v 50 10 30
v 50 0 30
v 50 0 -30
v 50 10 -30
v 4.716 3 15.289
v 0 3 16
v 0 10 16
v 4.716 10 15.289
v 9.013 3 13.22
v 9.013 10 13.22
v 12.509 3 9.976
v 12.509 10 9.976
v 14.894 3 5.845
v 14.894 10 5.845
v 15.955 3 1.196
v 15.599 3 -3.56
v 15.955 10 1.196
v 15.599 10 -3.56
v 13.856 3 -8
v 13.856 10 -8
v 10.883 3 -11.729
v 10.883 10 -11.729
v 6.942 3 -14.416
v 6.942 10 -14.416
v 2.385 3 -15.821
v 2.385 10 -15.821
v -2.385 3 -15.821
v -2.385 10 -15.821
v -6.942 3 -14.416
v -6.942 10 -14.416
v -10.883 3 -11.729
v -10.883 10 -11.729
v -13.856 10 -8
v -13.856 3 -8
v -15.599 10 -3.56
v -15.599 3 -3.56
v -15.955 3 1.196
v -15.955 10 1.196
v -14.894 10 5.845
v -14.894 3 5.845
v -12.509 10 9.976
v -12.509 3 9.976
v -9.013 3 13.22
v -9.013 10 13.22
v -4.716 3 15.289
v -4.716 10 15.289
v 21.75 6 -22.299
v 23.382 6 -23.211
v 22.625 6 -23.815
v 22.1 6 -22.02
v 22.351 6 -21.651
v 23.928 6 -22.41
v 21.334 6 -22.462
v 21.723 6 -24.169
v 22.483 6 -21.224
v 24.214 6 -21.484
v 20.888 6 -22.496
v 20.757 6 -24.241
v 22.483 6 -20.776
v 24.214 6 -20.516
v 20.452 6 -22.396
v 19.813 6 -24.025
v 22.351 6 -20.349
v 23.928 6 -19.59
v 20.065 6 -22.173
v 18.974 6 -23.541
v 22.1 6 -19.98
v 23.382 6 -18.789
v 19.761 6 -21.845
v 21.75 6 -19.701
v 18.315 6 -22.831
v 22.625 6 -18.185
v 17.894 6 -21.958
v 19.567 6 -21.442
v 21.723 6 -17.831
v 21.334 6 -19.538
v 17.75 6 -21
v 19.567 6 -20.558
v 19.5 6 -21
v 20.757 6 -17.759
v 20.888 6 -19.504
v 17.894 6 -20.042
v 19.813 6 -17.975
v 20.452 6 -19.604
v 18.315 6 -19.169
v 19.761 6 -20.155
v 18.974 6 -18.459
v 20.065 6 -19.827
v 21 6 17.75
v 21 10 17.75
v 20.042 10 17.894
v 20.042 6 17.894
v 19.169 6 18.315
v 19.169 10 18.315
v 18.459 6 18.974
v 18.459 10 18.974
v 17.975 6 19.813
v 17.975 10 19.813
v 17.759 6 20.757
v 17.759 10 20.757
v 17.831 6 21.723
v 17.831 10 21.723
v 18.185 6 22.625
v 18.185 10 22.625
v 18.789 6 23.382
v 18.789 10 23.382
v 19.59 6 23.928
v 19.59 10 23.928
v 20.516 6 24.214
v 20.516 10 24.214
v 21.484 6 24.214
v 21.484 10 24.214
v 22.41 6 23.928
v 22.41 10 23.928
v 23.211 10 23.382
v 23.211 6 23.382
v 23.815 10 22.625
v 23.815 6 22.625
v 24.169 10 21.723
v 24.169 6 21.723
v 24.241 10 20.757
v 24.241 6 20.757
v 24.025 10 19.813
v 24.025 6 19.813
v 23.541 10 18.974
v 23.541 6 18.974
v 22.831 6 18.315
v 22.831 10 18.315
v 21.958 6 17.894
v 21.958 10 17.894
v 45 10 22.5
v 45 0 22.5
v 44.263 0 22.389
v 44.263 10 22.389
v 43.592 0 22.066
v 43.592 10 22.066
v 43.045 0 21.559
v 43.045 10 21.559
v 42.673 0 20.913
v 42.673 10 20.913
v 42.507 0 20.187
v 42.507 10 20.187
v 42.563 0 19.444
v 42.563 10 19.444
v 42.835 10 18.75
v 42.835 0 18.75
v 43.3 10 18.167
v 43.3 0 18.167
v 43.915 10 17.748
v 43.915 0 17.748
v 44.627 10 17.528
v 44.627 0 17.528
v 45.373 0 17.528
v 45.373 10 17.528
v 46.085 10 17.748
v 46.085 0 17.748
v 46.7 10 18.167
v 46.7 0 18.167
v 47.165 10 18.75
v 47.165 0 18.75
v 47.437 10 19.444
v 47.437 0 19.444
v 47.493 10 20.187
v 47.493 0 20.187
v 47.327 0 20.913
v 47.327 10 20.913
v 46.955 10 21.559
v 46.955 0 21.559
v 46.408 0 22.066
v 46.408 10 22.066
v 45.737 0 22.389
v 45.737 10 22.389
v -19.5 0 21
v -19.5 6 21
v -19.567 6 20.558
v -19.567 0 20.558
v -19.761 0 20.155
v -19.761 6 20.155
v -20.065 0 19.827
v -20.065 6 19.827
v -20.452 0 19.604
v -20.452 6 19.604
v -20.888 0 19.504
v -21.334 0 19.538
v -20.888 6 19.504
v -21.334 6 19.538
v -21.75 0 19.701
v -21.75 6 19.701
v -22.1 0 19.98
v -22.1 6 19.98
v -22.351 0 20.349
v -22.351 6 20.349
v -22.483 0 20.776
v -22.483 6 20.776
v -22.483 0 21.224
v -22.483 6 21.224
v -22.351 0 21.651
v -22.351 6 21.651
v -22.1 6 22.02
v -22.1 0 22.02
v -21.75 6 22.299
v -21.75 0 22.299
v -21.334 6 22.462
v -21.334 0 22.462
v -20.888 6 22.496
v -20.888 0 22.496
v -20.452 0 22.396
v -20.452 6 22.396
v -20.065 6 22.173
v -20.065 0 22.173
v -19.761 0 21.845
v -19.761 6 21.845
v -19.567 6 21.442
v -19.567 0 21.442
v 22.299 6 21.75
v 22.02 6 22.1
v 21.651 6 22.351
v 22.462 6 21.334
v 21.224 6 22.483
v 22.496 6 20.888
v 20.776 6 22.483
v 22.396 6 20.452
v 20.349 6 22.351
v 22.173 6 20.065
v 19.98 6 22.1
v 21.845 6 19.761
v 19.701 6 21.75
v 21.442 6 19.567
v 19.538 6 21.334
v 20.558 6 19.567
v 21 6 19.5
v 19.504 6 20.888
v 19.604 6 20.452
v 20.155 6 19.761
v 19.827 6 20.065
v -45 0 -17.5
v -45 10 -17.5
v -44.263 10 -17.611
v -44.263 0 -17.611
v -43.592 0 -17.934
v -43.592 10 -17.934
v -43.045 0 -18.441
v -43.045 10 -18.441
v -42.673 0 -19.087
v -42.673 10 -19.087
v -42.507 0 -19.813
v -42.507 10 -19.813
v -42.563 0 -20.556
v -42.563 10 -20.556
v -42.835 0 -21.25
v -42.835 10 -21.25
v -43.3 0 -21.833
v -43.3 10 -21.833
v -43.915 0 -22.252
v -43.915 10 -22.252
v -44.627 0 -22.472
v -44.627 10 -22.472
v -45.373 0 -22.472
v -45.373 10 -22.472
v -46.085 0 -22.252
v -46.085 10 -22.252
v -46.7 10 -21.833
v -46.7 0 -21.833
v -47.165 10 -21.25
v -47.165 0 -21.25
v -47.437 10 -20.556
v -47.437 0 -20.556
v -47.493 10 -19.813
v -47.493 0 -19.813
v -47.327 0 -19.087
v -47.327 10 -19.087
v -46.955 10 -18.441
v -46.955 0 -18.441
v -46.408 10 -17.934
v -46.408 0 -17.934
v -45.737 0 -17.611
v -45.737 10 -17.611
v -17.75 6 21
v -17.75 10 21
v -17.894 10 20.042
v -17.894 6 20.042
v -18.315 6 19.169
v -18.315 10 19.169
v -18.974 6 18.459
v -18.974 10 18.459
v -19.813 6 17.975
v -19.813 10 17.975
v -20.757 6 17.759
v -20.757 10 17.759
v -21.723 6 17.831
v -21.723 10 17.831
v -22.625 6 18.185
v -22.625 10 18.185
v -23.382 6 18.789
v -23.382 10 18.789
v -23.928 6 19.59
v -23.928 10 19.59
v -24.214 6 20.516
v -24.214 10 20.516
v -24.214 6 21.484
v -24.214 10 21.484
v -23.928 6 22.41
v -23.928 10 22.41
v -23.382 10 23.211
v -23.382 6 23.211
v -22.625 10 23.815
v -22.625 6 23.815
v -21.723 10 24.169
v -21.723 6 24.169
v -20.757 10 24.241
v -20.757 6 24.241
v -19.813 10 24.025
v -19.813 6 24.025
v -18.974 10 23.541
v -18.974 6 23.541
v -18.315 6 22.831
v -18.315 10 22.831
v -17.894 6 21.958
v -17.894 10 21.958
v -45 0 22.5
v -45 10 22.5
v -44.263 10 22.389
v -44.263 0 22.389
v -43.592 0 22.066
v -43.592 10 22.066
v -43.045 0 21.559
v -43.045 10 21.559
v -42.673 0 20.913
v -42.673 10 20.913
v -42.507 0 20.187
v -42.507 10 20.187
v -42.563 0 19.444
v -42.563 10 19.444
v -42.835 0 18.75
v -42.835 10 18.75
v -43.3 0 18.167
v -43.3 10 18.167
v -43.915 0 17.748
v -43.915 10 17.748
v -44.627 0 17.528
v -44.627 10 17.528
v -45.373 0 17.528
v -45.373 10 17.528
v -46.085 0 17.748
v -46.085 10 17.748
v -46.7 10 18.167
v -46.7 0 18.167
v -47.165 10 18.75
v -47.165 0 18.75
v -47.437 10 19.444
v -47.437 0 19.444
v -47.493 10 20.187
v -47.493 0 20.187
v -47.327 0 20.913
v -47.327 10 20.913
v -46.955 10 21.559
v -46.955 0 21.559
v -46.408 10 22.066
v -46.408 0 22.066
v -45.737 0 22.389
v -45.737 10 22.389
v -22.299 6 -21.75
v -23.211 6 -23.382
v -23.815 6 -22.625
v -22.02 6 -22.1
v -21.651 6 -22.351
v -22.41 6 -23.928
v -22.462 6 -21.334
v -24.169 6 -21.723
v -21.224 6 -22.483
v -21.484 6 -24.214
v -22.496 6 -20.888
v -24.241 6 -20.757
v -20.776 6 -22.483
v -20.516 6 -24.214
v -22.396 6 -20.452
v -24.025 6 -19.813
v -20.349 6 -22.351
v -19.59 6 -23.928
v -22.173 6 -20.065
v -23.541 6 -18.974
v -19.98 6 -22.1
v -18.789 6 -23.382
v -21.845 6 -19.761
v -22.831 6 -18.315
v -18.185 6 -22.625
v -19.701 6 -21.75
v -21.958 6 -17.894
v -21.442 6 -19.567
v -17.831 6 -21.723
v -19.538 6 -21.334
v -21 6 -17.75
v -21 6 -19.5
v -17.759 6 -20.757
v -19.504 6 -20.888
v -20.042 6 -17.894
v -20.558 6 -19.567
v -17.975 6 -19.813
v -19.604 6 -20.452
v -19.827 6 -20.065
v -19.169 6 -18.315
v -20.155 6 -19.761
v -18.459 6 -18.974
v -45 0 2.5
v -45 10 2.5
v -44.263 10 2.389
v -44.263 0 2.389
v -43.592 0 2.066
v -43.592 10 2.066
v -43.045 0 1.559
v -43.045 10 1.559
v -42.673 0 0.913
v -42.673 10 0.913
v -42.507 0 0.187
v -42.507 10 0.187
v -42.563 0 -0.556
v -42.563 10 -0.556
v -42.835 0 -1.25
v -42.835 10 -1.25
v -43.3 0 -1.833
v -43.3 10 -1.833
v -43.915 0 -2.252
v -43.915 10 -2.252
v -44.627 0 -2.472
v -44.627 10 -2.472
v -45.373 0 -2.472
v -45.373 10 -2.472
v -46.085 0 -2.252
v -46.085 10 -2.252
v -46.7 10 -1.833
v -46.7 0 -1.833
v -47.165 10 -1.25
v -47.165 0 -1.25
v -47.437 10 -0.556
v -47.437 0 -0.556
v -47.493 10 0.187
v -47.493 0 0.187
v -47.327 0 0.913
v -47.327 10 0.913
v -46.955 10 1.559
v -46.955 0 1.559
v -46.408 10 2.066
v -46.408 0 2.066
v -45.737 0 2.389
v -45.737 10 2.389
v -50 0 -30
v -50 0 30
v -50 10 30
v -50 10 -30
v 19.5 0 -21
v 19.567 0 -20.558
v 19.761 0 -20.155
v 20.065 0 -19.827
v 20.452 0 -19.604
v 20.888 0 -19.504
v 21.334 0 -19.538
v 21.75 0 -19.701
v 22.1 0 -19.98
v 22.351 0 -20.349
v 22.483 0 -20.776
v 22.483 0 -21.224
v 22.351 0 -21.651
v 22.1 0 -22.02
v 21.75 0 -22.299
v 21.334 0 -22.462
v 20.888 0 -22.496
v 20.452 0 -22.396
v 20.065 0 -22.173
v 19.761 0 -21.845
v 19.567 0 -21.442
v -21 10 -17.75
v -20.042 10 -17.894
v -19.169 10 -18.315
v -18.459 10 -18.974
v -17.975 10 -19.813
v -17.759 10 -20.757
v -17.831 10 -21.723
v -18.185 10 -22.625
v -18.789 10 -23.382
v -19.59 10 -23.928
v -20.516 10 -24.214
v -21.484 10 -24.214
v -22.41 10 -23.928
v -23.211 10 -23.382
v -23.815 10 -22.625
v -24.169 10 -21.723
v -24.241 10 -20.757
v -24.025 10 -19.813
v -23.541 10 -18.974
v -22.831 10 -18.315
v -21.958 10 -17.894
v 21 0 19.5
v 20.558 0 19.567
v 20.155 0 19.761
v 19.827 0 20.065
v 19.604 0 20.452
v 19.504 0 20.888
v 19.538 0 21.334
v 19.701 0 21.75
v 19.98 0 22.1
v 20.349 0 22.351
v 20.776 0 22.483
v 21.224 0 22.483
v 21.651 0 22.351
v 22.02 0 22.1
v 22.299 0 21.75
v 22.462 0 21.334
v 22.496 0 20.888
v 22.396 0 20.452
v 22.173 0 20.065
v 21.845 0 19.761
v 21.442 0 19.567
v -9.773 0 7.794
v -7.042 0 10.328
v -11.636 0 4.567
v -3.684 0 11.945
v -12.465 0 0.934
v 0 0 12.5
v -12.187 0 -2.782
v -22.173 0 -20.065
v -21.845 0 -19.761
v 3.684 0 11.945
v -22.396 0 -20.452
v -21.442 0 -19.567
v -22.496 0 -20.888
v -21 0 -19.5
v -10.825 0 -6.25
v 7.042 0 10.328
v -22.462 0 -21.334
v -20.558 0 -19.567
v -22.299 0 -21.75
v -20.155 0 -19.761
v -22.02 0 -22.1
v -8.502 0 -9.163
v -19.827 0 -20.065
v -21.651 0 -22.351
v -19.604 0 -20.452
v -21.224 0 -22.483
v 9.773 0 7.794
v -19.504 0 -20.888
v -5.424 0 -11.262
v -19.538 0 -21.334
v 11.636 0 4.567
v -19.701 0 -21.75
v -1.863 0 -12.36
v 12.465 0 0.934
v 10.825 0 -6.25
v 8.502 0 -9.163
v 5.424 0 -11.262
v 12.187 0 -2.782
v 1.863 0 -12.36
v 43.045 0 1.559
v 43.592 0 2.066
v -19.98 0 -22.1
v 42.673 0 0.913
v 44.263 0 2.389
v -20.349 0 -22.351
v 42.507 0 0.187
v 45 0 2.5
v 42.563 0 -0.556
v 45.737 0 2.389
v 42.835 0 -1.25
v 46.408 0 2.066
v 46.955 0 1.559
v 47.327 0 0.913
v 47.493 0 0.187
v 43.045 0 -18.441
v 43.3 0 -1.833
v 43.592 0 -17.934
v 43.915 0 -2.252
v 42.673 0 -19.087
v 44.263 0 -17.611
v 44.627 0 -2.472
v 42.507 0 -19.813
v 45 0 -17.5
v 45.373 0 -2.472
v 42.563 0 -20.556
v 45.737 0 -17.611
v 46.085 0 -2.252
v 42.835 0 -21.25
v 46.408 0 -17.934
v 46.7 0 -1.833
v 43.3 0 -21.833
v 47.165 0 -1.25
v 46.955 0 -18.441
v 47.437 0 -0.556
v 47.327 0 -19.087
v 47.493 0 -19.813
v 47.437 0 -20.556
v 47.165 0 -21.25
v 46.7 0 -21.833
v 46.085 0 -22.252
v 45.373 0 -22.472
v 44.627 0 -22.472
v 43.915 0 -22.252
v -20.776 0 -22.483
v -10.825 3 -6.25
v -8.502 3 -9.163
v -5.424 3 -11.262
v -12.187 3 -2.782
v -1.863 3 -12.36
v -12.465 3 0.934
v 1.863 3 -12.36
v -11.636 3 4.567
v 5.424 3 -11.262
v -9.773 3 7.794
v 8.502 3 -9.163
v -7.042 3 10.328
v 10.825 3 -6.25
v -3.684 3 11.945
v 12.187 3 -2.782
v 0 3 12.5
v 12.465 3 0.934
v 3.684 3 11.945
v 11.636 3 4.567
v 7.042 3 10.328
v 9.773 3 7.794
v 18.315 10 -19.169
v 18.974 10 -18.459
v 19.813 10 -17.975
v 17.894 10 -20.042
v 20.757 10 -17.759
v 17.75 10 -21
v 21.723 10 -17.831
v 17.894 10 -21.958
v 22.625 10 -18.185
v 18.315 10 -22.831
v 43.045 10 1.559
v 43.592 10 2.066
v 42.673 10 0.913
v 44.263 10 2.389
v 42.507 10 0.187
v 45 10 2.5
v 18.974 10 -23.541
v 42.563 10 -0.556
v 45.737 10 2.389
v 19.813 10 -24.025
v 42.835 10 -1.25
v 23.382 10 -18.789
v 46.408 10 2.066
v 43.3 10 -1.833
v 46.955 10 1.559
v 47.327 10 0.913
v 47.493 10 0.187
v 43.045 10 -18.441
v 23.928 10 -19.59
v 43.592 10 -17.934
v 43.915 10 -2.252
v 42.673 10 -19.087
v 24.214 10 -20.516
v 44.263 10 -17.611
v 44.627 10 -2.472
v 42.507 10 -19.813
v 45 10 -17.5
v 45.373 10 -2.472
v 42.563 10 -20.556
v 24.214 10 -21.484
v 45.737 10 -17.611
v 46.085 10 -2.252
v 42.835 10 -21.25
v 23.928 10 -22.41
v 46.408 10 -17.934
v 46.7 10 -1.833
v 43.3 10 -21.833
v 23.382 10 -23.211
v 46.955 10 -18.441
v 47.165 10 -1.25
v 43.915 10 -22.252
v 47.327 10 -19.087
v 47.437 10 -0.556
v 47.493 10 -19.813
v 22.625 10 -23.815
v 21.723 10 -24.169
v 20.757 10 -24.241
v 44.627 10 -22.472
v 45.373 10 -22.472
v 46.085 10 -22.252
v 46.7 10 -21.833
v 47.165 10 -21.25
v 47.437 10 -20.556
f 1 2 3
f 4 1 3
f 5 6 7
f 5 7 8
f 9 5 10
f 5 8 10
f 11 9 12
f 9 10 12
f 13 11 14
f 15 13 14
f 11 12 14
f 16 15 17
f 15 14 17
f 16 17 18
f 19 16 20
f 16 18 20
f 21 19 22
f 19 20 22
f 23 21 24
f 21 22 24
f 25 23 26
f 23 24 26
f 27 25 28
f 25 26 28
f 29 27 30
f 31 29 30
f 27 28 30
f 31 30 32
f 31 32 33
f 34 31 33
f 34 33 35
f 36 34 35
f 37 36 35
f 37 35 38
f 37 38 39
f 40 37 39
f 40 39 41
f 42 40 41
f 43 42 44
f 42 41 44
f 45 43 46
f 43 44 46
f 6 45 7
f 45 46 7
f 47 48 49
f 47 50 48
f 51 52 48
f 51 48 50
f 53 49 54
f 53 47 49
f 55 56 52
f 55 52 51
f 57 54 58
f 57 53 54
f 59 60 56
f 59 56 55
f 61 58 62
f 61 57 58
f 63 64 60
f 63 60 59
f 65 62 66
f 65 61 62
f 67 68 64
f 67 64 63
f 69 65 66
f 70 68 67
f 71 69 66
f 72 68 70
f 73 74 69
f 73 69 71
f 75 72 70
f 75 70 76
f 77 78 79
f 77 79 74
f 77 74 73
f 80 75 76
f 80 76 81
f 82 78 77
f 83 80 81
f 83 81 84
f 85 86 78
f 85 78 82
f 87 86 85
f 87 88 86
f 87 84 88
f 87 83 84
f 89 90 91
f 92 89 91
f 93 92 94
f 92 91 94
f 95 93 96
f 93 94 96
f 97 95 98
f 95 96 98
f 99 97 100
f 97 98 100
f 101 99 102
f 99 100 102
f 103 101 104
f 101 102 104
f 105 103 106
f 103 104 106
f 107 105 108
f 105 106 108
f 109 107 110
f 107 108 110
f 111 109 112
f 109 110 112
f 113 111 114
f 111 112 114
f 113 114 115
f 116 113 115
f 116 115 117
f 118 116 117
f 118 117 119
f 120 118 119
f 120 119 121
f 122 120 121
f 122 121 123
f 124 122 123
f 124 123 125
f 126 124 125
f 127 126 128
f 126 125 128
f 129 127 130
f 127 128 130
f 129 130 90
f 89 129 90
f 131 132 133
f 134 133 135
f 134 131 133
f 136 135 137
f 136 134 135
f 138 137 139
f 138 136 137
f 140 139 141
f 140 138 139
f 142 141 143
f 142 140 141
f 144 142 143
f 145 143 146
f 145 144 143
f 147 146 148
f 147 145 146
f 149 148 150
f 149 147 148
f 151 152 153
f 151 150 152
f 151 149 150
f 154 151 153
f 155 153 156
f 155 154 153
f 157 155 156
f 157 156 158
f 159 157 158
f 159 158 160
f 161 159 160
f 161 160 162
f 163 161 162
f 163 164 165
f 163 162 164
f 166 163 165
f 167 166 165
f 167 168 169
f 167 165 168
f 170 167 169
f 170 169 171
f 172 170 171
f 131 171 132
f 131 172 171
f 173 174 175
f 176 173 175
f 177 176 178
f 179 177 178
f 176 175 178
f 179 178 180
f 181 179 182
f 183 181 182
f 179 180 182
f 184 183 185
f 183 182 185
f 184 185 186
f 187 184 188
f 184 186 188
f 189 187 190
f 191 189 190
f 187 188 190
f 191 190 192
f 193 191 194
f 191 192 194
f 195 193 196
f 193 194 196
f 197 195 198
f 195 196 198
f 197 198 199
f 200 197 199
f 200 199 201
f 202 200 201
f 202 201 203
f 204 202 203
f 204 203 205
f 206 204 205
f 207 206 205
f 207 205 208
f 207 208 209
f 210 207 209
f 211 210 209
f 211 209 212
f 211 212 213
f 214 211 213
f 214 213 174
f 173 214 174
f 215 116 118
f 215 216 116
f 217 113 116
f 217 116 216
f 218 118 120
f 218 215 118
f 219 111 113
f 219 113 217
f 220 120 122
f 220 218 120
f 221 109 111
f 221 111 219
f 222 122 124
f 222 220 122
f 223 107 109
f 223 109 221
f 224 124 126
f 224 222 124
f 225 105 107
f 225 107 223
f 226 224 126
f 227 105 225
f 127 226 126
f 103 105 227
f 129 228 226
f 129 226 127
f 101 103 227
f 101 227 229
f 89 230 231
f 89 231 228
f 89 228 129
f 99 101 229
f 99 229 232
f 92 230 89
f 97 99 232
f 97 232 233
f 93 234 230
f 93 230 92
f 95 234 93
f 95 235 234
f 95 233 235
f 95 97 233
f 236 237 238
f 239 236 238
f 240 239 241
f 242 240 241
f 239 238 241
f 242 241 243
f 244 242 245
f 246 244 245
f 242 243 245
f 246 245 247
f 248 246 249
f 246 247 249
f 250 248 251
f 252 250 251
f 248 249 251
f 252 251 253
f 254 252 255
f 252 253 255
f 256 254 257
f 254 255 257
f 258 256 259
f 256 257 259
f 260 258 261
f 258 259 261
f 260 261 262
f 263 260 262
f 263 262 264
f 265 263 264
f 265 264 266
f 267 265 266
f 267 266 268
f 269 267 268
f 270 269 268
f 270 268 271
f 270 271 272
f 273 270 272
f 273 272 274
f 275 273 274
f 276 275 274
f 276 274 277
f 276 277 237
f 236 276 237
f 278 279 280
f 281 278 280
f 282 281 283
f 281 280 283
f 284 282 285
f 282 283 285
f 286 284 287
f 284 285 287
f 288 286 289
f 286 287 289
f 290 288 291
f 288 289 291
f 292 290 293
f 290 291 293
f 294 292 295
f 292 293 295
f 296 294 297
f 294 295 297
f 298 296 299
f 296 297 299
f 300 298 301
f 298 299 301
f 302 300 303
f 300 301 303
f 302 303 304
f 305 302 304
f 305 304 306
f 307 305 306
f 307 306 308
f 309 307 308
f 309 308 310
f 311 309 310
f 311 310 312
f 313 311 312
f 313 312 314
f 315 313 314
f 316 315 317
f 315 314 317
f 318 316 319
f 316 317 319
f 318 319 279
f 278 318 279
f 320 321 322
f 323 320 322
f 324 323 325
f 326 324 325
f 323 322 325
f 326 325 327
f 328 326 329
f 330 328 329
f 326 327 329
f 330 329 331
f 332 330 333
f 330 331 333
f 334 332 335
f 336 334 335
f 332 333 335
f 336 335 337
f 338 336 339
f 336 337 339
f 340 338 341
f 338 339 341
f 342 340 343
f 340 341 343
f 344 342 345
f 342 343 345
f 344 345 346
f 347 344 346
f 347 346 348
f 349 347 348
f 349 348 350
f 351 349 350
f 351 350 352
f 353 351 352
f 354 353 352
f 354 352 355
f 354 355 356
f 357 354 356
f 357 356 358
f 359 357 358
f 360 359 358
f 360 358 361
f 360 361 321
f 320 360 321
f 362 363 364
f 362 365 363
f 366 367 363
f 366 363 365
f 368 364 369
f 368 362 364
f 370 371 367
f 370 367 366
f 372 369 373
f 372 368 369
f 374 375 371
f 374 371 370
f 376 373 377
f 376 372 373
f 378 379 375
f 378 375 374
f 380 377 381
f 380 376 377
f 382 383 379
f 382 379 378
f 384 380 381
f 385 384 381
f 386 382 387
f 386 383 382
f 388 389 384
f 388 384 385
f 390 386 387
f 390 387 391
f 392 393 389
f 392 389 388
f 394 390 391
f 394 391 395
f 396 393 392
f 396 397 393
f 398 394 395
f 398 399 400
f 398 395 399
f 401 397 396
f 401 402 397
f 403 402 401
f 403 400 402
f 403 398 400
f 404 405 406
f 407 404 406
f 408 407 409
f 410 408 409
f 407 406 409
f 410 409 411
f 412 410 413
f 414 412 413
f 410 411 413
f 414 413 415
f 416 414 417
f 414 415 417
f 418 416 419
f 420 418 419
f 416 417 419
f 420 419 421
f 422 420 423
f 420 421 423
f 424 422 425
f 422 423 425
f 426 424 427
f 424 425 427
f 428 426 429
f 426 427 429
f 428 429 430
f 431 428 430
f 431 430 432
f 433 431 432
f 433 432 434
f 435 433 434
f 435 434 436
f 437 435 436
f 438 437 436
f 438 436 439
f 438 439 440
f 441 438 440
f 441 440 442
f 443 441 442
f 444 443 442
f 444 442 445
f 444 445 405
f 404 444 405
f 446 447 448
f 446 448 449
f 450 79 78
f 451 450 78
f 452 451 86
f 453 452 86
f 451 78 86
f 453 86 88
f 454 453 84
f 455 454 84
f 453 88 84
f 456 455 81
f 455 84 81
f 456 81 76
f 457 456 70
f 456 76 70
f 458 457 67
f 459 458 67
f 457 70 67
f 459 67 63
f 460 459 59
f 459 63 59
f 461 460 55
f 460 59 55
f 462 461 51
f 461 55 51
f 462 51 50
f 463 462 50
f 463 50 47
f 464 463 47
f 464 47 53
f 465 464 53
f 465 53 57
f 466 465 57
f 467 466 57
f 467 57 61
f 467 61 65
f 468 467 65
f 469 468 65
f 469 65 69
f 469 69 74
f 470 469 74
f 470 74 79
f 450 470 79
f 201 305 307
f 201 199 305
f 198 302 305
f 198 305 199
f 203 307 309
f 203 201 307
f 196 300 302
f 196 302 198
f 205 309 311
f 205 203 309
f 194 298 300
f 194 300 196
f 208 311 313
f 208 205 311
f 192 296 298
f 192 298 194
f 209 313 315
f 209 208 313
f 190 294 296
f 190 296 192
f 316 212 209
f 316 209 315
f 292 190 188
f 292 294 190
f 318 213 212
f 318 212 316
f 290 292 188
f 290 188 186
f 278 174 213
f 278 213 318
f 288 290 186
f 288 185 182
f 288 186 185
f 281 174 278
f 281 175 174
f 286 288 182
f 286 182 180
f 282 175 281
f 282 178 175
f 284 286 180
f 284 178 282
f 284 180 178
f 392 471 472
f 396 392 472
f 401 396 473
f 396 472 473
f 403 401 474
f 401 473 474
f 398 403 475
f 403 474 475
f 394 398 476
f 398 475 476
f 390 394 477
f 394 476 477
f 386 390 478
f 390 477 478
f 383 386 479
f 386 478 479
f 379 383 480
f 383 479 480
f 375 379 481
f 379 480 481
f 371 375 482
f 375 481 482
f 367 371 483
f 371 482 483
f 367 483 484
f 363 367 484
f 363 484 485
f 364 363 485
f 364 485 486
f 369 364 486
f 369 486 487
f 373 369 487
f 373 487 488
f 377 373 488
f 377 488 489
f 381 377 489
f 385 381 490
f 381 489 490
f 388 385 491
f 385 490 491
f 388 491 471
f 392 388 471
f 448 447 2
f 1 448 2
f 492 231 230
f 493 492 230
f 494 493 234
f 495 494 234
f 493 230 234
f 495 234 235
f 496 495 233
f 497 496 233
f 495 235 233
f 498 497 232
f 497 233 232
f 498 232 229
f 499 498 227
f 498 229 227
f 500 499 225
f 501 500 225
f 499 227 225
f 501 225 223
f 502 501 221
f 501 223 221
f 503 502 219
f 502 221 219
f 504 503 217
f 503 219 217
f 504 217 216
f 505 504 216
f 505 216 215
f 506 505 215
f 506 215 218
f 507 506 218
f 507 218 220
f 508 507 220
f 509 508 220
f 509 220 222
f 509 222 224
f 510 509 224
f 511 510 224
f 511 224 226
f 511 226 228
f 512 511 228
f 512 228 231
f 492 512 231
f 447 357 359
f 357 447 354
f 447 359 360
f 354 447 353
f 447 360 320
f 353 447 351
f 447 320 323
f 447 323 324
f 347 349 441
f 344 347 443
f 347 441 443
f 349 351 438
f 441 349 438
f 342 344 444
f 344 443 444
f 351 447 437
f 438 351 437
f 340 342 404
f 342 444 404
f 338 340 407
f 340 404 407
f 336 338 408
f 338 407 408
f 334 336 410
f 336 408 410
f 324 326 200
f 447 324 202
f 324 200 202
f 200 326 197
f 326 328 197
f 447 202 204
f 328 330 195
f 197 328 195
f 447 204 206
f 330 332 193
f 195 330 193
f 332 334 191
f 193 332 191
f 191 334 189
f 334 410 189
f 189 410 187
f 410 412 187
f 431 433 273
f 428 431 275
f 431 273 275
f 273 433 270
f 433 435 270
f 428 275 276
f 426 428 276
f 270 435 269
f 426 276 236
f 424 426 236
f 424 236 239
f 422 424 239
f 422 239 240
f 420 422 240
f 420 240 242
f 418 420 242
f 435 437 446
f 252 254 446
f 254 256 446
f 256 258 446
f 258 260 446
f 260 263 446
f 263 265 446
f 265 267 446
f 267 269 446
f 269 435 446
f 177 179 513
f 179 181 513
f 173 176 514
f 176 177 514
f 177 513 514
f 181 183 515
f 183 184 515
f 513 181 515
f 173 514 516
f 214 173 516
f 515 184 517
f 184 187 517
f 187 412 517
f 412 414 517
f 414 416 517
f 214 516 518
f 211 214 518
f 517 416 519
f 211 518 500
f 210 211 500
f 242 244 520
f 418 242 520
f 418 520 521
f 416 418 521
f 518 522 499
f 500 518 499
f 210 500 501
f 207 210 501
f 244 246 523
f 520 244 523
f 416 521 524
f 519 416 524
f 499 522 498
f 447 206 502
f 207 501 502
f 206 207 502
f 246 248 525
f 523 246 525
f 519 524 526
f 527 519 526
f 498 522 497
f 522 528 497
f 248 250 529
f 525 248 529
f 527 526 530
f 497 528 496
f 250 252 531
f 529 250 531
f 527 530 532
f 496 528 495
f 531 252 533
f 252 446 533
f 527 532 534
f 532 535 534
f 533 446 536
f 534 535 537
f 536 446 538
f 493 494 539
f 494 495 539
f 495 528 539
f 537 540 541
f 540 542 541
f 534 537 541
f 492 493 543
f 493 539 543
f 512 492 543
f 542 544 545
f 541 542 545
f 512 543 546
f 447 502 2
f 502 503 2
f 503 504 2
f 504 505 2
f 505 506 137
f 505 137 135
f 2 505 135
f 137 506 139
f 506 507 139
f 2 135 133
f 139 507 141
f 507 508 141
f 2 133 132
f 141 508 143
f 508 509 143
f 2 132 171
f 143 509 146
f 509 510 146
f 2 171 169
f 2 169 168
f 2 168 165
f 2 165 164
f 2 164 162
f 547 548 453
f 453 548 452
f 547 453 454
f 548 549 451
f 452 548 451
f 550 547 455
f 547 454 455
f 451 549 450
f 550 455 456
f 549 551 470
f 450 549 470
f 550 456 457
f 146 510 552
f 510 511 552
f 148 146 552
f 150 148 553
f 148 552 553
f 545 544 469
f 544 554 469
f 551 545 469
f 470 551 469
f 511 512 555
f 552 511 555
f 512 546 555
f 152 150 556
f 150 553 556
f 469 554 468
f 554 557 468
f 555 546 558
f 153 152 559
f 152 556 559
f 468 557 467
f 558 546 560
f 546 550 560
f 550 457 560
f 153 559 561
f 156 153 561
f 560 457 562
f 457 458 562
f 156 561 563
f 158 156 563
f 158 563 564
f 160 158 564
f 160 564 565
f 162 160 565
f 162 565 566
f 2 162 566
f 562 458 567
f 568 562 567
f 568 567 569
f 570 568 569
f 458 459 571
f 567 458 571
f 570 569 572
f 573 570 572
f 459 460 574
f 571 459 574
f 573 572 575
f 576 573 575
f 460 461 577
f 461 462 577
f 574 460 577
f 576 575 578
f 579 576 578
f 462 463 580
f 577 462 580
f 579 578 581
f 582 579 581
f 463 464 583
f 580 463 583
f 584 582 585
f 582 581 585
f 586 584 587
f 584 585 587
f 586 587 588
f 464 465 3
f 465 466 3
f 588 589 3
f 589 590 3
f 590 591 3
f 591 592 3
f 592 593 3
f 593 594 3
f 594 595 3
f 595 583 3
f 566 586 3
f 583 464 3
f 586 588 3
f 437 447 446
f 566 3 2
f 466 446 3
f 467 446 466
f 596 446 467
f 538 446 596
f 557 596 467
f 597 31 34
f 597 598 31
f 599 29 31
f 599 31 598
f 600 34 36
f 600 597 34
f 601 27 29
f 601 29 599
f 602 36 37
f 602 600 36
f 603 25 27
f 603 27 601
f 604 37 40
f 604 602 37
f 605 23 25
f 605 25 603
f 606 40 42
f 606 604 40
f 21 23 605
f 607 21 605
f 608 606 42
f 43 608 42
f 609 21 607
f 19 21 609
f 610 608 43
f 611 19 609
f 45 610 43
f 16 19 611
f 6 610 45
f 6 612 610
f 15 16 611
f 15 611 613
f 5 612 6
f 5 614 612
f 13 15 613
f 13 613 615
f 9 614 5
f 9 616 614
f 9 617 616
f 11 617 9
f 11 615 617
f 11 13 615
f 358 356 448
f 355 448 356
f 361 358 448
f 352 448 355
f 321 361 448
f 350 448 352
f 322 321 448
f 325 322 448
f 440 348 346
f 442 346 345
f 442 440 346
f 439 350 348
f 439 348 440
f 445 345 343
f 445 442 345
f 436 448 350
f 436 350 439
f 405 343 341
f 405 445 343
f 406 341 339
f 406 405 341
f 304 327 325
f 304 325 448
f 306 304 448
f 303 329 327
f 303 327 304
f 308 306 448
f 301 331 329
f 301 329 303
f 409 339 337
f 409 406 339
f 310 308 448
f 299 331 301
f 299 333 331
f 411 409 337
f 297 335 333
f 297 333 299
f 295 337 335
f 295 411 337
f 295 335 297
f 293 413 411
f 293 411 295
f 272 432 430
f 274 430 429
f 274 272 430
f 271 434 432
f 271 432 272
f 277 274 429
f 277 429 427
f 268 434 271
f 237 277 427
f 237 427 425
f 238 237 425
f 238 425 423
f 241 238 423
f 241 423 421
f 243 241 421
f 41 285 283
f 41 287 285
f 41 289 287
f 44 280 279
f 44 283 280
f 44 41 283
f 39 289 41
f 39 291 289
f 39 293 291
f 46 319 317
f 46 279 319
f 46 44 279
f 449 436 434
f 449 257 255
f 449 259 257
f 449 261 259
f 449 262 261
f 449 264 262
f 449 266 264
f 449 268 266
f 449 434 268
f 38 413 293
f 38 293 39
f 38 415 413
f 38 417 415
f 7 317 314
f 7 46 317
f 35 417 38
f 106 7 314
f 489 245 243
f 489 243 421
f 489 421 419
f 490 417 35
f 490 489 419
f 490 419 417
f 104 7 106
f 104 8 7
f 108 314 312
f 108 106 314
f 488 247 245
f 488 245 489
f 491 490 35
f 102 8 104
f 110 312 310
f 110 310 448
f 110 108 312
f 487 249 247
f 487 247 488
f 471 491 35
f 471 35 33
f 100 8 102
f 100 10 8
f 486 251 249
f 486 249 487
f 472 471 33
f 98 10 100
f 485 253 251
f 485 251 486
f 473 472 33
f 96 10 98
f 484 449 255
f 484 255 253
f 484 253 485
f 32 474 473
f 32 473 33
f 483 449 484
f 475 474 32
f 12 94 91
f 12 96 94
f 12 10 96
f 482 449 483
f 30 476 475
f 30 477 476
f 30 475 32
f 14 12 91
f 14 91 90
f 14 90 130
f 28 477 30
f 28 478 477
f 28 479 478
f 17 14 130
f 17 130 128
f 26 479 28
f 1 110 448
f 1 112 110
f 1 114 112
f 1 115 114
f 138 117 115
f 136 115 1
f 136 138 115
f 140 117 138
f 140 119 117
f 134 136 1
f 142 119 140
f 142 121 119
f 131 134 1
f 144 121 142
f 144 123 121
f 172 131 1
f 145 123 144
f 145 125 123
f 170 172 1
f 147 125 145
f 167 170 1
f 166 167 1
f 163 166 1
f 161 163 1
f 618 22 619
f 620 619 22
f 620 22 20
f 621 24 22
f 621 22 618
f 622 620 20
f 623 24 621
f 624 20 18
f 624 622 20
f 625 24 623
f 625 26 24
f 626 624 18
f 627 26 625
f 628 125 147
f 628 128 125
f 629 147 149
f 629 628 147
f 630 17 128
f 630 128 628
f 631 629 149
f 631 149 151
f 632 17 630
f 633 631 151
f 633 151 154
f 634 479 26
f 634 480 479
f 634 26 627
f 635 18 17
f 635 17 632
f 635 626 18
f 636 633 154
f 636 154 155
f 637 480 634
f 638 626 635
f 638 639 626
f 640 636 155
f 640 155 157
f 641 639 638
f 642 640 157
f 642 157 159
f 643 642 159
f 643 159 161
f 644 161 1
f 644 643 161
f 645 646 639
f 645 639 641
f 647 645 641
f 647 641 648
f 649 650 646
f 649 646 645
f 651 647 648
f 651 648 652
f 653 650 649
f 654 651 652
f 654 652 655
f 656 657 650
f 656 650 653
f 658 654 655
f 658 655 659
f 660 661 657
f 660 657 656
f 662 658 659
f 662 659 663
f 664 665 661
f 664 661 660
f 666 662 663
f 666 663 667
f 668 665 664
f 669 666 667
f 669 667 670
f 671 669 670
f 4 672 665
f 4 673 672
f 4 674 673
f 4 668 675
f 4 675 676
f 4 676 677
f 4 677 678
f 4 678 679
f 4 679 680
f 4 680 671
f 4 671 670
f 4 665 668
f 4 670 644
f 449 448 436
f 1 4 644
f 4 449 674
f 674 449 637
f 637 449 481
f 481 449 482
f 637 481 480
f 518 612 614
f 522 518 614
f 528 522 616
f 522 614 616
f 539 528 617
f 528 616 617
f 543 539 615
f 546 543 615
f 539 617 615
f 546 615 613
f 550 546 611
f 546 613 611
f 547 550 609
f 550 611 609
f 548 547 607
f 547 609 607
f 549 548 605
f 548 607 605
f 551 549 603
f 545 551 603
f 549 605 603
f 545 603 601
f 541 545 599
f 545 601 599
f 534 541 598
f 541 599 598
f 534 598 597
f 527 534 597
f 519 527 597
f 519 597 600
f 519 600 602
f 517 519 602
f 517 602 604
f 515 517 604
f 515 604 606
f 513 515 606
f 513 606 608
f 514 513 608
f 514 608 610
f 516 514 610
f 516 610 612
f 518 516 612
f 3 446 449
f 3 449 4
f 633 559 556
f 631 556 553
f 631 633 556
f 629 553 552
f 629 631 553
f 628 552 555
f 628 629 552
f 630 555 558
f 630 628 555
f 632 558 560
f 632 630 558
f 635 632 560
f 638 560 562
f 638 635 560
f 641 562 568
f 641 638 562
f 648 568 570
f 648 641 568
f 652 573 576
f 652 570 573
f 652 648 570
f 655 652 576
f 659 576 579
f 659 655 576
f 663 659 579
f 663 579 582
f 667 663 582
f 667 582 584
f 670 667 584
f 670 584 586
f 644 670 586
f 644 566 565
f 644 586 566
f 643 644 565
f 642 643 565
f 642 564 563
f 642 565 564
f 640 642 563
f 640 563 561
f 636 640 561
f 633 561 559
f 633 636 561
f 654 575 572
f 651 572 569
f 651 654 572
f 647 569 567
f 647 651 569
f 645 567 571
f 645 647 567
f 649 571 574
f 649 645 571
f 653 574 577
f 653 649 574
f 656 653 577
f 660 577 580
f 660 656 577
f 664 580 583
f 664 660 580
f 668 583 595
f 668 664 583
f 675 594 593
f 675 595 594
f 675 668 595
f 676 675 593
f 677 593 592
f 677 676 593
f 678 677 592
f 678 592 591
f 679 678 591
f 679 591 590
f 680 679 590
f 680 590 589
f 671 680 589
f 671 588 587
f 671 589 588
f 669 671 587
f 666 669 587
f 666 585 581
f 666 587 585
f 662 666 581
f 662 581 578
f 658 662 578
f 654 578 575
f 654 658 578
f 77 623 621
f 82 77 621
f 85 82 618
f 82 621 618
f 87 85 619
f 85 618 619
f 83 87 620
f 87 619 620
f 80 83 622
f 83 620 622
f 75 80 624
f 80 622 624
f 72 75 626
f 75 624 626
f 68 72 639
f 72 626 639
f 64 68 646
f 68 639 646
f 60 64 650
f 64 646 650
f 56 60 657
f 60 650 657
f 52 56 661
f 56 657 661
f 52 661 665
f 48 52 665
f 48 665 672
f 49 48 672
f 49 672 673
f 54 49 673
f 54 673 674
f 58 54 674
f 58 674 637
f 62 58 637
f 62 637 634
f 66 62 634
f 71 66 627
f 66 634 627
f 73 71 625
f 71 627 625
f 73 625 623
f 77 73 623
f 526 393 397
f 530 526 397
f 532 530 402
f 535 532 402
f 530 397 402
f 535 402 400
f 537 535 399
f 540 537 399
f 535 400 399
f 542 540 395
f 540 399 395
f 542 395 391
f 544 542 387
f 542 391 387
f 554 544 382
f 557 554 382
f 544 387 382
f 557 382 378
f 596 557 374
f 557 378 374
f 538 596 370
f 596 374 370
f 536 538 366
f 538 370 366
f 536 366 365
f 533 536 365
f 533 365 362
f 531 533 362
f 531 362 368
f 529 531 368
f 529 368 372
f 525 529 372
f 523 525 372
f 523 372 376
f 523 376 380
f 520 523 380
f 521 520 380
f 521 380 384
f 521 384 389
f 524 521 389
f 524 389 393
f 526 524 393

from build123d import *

# Parameters (mm, degrees)
SKETCH1_W           = 100
SKETCH1_H           = 60
BOSS_EXTRUDE1_DEPTH = 10
SKETCH2_R           = 2.5
CUT_EXTRUDE1_DEPTH  = 60.160797831
SKETCH3_R           = 16
CUT_EXTRUDE2_DEPTH  = 7
SKETCH4_R           = 12.5
CUT_EXTRUDE3_DEPTH  = 59.72818744
SKETCH5_R           = 1.5
CUT_EXTRUDE4_DEPTH  = 60.160797831
SKETCH6_R           = 3.25
CUT_EXTRUDE5_DEPTH  = 4
CIRPATTERN1_COUNT   = 4


with BuildPart() as part:
    # Sketch1 → Boss-Extrude1 (new body)
    with BuildSketch(Plane(origin=(0, 0, 0), x_dir=(1, 0, 0), z_dir=(0, 1, 0))):
        Rectangle(SKETCH1_W, SKETCH1_H)
    extrude(amount=BOSS_EXTRUDE1_DEPTH)

    # Sketch2 → Cut-Extrude1 (cut, through all)
    with BuildSketch(Plane(origin=(0, 10, 0), x_dir=(1, 0, 0), z_dir=(0, 1, 0))):
        with Locations(Location((-45, -20, 0), (0, 0, 270))):
            Circle(SKETCH2_R)
        with Locations(Location((-45, 0, 0), (0, 0, 270))):
            Circle(SKETCH2_R)
        with Locations(Location((-45, 20, 0), (0, 0, 270))):
            Circle(SKETCH2_R)
    cut_extrude1 = extrude(amount=-CUT_EXTRUDE1_DEPTH, mode=Mode.SUBTRACT)

    # Mirror1: Cut-Extrude1 across plane
    add(cut_extrude1.mirror(Plane(origin=(0, 0, 0), x_dir=(0, 0, 1), z_dir=(1, 0, 0))), mode=Mode.SUBTRACT)

    # Sketch3 → Cut-Extrude2 (cut)
    with BuildSketch(Plane(origin=(0, 10, 0), x_dir=(1, 0, 0), z_dir=(0, 1, 0))):
        with Locations(Location((0, 0, 0), (0, 0, 270))):
            Circle(SKETCH3_R)
    extrude(amount=-CUT_EXTRUDE2_DEPTH, mode=Mode.SUBTRACT)

    # Sketch4 → Cut-Extrude3 (cut, through all)
    with BuildSketch(Plane(origin=(0, 3, 0), x_dir=(1, 0, 0), z_dir=(0, 1, 0))):
        with Locations(Location((0, 0, 0), (0, 0, 270))):
            Circle(SKETCH4_R)
    extrude(amount=-CUT_EXTRUDE3_DEPTH, mode=Mode.SUBTRACT)

    # Sketch5 → Cut-Extrude4 (cut, through all)
    with BuildSketch(Plane(origin=(0, 10, 0), x_dir=(1, 0, 0), z_dir=(0, 1, 0))):
        with Locations(Location((-21, 21, 0), (0, 0, 270))):
            Circle(SKETCH5_R)
    cut_extrude4 = extrude(amount=-CUT_EXTRUDE4_DEPTH, mode=Mode.SUBTRACT)

    # Sketch6 → Cut-Extrude5 (cut)
    with BuildSketch(Plane(origin=(0, 10, 0), x_dir=(1, 0, 0), z_dir=(0, 1, 0))):
        with Locations(Location((-21, 21, 0), (0, 0, 270))):
            Circle(SKETCH6_R)
    cut_extrude5 = extrude(amount=-CUT_EXTRUDE5_DEPTH, mode=Mode.SUBTRACT)

    # CirPattern1: Cut-Extrude4, Cut-Extrude5 ×4 about axis
    cirpattern1_axis = Axis((0, 0, 0), (0, 1, 0))
    add([cut_extrude4.rotate(cirpattern1_axis, i * 360 / CIRPATTERN1_COUNT) for i in range(1, CIRPATTERN1_COUNT)], mode=Mode.SUBTRACT)
    add([cut_extrude5.rotate(cirpattern1_axis, i * 360 / CIRPATTERN1_COUNT) for i in range(1, CIRPATTERN1_COUNT)], mode=Mode.SUBTRACT)


solid = part.part
